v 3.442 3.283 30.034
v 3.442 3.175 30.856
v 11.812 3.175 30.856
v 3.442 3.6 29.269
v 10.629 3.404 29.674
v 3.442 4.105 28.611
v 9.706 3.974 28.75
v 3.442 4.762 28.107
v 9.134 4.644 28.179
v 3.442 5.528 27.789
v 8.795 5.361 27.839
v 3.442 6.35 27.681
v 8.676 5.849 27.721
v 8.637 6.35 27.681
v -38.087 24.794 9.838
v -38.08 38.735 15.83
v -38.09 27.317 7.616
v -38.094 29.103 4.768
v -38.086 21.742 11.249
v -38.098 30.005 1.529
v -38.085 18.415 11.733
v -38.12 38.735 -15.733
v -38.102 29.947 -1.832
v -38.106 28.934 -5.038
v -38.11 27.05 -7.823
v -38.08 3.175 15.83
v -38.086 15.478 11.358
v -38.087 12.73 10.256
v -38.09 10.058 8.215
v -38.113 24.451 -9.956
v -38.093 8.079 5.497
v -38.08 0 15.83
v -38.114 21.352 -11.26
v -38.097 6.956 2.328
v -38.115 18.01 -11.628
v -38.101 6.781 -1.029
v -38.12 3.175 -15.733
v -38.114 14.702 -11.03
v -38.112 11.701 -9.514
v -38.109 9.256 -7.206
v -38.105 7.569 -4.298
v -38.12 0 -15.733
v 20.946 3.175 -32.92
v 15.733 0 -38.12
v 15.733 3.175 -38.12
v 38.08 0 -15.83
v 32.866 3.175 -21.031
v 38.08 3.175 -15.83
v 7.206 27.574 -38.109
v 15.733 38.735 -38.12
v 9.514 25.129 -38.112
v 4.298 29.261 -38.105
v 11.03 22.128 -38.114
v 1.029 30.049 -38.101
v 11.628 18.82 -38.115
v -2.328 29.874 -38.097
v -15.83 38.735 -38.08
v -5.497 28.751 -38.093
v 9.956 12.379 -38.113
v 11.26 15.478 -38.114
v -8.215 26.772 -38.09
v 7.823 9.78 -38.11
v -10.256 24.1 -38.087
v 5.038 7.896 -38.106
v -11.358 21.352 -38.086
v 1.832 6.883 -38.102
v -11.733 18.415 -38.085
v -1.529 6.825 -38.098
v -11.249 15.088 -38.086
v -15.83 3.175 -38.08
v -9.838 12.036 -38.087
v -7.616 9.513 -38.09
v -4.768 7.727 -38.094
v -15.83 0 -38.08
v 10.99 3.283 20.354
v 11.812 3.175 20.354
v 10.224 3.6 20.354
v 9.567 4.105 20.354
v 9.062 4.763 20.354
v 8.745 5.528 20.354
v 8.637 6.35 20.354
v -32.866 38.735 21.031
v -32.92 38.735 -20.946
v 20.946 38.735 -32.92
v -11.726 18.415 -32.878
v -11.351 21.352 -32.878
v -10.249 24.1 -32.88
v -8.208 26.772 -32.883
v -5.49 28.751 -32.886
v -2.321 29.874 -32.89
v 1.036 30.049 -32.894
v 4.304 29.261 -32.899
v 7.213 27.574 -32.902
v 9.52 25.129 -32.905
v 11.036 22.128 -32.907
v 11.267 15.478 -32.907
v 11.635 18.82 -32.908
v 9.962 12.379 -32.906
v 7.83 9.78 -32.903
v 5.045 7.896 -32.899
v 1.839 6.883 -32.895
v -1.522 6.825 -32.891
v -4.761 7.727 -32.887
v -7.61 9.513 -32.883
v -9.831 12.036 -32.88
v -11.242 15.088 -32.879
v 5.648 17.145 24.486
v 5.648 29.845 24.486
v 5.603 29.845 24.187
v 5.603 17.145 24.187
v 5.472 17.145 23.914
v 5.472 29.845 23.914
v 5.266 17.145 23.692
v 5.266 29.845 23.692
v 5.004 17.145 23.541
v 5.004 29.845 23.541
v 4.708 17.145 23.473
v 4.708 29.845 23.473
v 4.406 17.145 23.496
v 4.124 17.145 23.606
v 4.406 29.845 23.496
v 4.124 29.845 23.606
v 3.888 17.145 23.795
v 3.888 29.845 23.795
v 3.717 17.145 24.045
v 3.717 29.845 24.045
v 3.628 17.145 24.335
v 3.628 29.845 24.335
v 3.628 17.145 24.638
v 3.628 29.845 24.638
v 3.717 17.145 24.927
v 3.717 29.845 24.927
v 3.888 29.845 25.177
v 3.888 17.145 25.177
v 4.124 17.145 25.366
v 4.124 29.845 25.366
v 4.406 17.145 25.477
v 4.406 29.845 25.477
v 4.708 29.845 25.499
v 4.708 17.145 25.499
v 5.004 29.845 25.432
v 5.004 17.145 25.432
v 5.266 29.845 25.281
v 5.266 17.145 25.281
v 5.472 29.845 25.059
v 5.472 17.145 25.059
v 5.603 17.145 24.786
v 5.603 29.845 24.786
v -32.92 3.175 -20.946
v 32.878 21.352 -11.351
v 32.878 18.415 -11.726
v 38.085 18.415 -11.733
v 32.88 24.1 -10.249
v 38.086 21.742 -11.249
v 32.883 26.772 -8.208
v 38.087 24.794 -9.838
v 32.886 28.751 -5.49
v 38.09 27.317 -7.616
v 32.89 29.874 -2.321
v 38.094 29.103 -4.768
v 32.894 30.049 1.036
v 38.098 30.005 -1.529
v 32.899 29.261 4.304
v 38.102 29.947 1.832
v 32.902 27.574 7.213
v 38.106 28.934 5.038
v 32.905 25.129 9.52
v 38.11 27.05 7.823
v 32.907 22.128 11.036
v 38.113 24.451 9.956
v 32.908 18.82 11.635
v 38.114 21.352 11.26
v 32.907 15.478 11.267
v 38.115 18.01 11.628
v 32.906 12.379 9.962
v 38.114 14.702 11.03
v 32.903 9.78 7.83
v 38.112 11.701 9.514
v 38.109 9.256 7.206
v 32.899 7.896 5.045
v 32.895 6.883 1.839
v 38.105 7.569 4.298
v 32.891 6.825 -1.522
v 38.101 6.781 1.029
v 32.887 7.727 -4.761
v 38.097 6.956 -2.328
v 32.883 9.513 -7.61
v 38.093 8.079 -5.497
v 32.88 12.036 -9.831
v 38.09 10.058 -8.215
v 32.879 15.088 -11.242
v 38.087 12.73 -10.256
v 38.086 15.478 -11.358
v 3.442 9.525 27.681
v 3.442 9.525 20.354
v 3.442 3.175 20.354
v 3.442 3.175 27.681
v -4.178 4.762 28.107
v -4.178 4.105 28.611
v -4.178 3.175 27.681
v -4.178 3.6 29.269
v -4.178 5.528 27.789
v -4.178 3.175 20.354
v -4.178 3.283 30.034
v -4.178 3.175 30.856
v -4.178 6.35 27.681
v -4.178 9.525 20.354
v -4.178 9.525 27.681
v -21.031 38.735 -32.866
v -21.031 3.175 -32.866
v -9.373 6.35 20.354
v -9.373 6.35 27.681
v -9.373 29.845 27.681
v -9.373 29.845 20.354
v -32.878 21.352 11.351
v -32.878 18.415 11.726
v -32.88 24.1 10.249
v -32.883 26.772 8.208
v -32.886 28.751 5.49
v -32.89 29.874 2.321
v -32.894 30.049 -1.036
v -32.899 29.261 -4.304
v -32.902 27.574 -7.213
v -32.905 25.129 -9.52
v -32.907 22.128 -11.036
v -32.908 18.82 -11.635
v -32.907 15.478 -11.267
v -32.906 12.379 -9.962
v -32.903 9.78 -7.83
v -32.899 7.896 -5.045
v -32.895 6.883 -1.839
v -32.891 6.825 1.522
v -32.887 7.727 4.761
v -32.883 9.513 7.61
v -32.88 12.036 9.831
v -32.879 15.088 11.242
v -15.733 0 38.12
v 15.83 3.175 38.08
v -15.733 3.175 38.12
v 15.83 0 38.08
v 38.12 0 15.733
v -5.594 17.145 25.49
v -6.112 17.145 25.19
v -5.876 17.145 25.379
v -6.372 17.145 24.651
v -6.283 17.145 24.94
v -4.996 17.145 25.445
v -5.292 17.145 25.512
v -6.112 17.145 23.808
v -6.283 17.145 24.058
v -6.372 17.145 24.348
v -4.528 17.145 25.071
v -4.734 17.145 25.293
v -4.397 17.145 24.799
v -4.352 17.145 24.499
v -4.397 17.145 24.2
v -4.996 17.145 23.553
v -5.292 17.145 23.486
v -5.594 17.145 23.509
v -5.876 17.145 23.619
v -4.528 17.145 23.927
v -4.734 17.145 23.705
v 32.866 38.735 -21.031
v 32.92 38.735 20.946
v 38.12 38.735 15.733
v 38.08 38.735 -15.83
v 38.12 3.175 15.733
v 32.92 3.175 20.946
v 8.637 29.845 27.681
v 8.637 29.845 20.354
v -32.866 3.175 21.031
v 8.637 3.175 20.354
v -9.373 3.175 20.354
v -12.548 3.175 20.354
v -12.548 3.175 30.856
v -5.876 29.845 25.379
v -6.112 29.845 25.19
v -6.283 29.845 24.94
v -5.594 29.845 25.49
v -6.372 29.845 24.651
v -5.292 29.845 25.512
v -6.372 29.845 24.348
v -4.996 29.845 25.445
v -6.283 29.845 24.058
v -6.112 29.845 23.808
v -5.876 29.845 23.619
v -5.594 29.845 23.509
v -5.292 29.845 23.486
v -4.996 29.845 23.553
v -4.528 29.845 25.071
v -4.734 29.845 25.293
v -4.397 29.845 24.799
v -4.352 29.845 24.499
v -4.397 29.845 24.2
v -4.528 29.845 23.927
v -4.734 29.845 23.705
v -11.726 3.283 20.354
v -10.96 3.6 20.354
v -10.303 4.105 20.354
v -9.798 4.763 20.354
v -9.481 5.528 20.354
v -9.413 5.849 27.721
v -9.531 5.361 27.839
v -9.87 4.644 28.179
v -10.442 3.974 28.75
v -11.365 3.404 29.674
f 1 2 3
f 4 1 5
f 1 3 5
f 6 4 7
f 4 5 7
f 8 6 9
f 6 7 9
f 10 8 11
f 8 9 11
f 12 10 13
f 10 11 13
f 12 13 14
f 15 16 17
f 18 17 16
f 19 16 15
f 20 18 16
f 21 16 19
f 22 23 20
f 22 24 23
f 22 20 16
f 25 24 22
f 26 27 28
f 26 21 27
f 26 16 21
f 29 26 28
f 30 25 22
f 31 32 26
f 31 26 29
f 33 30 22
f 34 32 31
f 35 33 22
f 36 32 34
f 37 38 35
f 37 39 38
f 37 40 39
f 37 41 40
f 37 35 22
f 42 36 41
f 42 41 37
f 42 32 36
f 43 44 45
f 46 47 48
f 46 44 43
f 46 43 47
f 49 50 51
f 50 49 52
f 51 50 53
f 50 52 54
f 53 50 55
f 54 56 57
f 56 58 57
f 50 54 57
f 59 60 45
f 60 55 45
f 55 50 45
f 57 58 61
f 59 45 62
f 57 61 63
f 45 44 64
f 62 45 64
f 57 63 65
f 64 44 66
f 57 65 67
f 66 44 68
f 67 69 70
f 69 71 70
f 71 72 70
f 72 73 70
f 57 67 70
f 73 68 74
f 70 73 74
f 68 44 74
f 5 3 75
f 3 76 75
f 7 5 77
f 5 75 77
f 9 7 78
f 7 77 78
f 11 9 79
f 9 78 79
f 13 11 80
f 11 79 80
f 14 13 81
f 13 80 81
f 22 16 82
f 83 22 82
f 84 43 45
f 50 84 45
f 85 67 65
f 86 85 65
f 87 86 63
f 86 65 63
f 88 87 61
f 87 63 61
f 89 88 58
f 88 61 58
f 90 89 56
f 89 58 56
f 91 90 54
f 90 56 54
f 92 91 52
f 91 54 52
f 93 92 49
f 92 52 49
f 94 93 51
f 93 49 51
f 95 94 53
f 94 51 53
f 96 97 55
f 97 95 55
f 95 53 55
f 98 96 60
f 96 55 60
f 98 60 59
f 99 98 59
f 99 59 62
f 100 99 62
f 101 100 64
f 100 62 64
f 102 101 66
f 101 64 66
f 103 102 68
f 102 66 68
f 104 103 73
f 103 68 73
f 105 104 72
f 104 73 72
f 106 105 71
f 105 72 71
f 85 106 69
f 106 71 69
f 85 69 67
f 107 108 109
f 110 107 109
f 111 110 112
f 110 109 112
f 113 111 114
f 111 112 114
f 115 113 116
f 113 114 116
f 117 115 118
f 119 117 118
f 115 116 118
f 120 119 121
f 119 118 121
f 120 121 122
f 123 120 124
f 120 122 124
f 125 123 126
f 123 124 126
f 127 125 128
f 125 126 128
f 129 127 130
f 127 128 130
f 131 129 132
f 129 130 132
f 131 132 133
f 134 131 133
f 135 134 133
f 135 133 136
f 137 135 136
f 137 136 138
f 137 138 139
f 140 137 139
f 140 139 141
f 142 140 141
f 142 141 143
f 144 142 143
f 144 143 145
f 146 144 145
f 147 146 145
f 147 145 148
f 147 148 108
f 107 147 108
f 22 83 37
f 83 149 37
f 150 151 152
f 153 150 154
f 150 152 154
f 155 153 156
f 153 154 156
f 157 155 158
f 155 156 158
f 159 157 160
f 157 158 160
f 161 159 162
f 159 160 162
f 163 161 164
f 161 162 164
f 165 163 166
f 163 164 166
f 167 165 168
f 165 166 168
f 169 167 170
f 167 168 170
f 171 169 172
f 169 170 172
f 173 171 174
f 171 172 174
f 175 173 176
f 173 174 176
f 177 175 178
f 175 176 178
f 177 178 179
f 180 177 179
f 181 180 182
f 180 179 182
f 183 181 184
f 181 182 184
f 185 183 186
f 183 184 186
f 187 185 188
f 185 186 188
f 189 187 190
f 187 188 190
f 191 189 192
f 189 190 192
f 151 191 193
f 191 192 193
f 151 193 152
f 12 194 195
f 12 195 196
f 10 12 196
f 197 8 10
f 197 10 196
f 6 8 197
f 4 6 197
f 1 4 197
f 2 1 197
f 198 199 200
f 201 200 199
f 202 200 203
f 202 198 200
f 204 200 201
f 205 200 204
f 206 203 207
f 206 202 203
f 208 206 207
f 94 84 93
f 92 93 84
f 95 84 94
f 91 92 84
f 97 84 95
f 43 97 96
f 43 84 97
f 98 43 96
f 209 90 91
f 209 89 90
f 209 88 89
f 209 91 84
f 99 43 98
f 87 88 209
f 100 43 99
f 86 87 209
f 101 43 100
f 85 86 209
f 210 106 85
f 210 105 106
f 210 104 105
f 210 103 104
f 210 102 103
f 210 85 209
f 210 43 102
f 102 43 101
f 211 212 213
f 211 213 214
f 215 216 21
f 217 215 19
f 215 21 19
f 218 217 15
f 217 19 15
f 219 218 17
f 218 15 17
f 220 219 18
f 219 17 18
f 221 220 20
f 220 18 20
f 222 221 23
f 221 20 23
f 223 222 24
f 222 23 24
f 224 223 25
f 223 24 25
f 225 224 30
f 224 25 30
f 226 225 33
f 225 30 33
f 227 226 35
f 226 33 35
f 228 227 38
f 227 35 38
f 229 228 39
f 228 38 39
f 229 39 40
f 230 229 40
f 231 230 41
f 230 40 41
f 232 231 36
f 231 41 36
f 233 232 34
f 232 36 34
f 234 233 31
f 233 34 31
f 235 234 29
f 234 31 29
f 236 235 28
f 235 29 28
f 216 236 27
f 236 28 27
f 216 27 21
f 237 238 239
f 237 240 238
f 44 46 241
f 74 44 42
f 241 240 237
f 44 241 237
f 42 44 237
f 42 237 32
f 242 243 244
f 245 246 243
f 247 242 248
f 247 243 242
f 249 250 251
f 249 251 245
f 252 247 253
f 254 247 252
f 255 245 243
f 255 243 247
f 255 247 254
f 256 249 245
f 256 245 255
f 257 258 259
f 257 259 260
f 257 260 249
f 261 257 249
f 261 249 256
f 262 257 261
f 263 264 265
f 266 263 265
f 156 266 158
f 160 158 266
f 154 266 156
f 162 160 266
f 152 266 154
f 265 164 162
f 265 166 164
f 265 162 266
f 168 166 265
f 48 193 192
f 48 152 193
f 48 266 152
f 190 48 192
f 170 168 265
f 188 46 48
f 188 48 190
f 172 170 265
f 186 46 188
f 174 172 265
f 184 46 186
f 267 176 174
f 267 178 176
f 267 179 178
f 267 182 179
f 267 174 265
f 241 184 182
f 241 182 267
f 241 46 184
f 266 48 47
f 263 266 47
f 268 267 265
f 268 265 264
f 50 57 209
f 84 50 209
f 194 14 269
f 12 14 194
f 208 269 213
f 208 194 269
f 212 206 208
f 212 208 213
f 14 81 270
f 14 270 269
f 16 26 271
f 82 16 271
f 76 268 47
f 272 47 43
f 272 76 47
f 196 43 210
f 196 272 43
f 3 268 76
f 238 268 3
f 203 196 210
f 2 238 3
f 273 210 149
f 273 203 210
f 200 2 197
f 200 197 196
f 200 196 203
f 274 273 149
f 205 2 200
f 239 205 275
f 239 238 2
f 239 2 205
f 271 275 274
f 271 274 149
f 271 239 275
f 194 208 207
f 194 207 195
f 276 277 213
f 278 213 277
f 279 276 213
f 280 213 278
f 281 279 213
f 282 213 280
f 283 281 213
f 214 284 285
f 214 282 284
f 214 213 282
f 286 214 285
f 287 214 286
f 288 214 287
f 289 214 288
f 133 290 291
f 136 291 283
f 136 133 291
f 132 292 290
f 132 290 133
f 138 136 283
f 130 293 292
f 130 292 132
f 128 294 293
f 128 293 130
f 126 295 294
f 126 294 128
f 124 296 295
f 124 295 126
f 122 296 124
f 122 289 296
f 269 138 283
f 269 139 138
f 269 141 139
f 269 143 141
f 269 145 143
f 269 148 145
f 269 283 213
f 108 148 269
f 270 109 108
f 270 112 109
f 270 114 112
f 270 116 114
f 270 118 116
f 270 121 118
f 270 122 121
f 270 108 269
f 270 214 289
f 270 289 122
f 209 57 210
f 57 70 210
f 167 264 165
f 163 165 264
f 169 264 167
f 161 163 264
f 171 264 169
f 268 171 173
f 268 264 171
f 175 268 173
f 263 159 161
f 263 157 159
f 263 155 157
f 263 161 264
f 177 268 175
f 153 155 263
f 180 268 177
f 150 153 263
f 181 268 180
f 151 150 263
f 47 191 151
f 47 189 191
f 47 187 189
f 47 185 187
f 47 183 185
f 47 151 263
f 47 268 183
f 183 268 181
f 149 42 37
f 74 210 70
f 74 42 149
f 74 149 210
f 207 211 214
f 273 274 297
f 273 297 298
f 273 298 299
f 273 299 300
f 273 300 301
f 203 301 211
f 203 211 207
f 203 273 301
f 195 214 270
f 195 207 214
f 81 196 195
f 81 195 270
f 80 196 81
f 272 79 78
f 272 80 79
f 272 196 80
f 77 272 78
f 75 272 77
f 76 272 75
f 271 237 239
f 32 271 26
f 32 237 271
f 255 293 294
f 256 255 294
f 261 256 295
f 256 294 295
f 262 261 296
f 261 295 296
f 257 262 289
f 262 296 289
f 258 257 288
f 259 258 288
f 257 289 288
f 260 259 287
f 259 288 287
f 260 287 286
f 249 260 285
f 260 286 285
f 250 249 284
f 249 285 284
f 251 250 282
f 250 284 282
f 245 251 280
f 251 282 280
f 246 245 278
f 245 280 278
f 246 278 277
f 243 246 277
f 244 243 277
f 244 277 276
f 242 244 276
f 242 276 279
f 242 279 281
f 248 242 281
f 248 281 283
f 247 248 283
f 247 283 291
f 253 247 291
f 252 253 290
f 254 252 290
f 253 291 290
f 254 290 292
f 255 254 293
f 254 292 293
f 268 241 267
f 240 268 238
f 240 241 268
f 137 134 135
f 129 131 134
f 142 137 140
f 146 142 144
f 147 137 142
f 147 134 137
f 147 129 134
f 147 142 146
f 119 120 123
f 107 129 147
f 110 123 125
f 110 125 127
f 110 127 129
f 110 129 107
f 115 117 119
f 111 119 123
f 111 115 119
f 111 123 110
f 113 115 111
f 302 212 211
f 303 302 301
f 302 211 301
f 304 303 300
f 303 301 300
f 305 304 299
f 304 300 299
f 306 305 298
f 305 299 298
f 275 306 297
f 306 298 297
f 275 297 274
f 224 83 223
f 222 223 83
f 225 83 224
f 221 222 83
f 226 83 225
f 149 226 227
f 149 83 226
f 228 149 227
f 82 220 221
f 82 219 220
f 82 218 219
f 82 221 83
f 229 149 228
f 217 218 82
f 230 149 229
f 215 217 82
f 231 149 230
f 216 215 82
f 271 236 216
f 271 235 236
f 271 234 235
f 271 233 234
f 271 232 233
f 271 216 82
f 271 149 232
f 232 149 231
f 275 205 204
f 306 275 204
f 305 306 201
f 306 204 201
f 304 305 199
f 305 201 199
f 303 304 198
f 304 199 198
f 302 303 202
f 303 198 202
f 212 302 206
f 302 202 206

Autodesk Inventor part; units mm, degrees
ref_plane "YZ Plane" through (0, 0, 0) normal (1, 0, 0) x (0, 1, 0)
ref_plane "XZ Plane" through (0, 0, 0) normal (0, 1, 0) x (-1, 0, 0)
ref_plane "XY Plane" through (0, 0, 0) normal (0, 0, 1) x (1, 0, 0)
sketch "Sketch1" plane through (0, 0, 0) normal (0, 1, 0) x (-1, 0, 0)
  line L0 (15.8302, -38.0798) -> (-15.7328, -38.1201)
  line L1 (-15.7328, -38.1201) -> (-38.0798, -15.8302)
  line L2 (-38.0798, -15.8302) -> (-38.1201, 15.7328)
  line L3 (-38.1201, 15.7328) -> (-15.8302, 38.0798)
  line L4 (-15.8302, 38.0798) -> (15.7328, 38.1201)
  line L5 (15.7328, 38.1201) -> (38.0798, 15.8302)
  line L6 (38.0798, 15.8302) -> (38.1201, -15.7328)
  line L7 (38.1201, -15.7328) -> (15.8302, -38.0798)
  point P0 (0, 0)
  point P1 (0, 0)
  dimension "d0" = 76.2
extrude "Extrusion1" add sketch "Sketch1" along normal blind 3.175
sketch "Sketch3" plane through (0, 3.175, 0) normal (0, 1, 0) x (1, 0, 0)
  line L0 (38.1201, -15.7328) -> (38.0798, 15.8302) projected
  line L1 (-38.1201, 15.7328) -> (-38.0798, -15.8302) projected
  line L2 (32.9198, -20.9465) -> (32.8661, 21.0306)
  line L3 (-32.9198, 20.9465) -> (-32.8661, -21.0306)
  line L4 (-38.1201, 15.7328) -> (-38.0798, -15.8302) projected
  line L5 (38.1201, -15.7328) -> (38.0798, 15.8302) projected
  line L6 (38.1201, -15.7328) -> (32.9198, -20.9465)
  line L7 (38.0798, 15.8302) -> (38.1201, -15.7328) projected
  line L8 (38.1201, -15.7328) -> (38.0798, 15.8302)
  line L9 (38.0798, 15.8302) -> (32.8661, 21.0306)
  line L10 (-32.9198, 20.9465) -> (-38.1201, 15.7328)
  line L11 (-38.1201, 15.7328) -> (-38.0798, -15.8302)
  line L12 (-38.0798, -15.8302) -> (-38.1201, 15.7328) projected
  line L13 (-38.0798, -15.8302) -> (-32.8661, -21.0306)
  line L14 (-38.0798, -15.8302) -> (-15.7328, -38.1201) projected
  line L15 (15.8302, -38.0798) -> (38.1201, -15.7328) projected
  line L16 (38.0798, 15.8302) -> (15.7328, 38.1201) projected
  line L17 (38.1201, -15.7328) -> (32.9198, -20.9465)
  line L18 (38.0798, 15.8302) -> (32.8661, 21.0306)
  line L19 (15.7328, 38.1201) -> (38.0798, 15.8302) projected
  line L20 (38.1201, -15.7328) -> (38.0798, 15.8302)
  point P0 (0, 0)
  dimension "d5" = 5.207
  dimension "d6" = 5.207
extrude "Extrusion2" add sketch "Sketch3" along normal blind 35.56
sketch "Sketch5" plane through (38.0798, 0, -15.8302) normal (1, 0, -0.0013) x (-0.0013, 0, -1)
  circle A0 centre (-15.7815, 18.415) radius 11.43 projected
  circle A1 centre (-15.7815, 18.415) radius 11.684
  point P0 (-15.7815, 0)
  dimension "d9" = 0.254
extrude "Extrusion3" cut sketch "Sketch5" against normal blind 26.416 contours A0 | A1
sketch "Sketch6" plane through (-38.0798, 0, 15.8302) normal (-1, 0, 0.0013) x (0.0013, 0, 1)
  circle A0 centre (-15.7815, 18.415) radius 11.43 projected
  circle A1 centre (-15.7815, 18.415) radius 11.684
  point P0 (-15.7815, 0)
  dimension "d12" = 0.254
extrude "Extrusion4" cut sketch "Sketch6" against normal blind 26.416 contours A0 | A1
sketch "Sketch7" plane through (0, 3.175, 0) normal (0, 1, 0) x (1, 0, 0)
  line L0 (15.7328, 38.1201) -> (-15.8302, 38.0798) projected
  line L1 (20.9465, 32.9198) -> (-21.0306, 32.8661)
  line L2 (-15.8302, 38.0798) -> (-32.9198, 20.9465) projected
  line L3 (32.8661, 21.0306) -> (15.7328, 38.1201) projected
  line L4 (-38.1201, 15.7328) -> (-15.8302, 38.0798) projected
  line L5 (-21.0306, 32.8661) -> (-15.8302, 38.0798)
  line L6 (-15.8302, 38.0798) -> (15.7328, 38.1201)
  line L7 (20.9465, 32.9198) -> (15.7328, 38.1201)
  point P0 (0, 0)
  dimension "d15" = 5.207
extrude "Extrusion5" add sketch "Sketch7" along normal blind 35.56
sketch "Sketch8" plane through (-15.8302, 0, -38.0798) normal (-0.0013, 0, -1) x (-1, 0, 0.0013)
  circle A0 centre (-15.7815, 18.415) radius 11.43 projected
  circle A1 centre (-15.7815, 18.415) radius 11.684
  point P0 (-15.7815, 0)
  dimension "d18" = 0.254
extrude "Extrusion6" cut sketch "Sketch8" against normal blind 26.416 contours A0 | A1
sketch "Sketch9" plane through (0, 3.175, 0) normal (0, 1, 0) x (1, 0, 0)
  line L0 (-9.3728, -20.3542) -> (-9.3647, -26.7042) projected
  line L1 (8.6353, -26.6812) -> (8.6272, -20.3312) projected
  line L2 (-8.3634, -27.7029) -> (7.6366, -27.6825) projected
  line L3 (-9.3728, -20.3542) -> (8.6366, -20.3542)
  line L4 (8.6366, -20.3542) -> (8.6366, -27.6812)
  line L5 (8.6366, -27.6812) -> (-9.3728, -27.6812)
  line L6 (-9.3728, -27.6812) -> (-9.3728, -20.3542)
  point P0 (0, 0)
extrude "Extrusion7" add sketch "Sketch9" along normal blind 26.67
sketch "Sketch10" plane through (0, 29.845, 0) normal (0, 1, 0) x (1, 0, 0)
  arc A0 (-5.3692, -23.1491) -> (-5.3658, -25.8491) centre (-5.3675, -24.4991) ccw projected
  arc A1 (-5.3658, -25.8491) -> (-5.3692, -23.1491) centre (-5.3675, -24.4991) ccw projected
  arc A2 (4.6308, -23.1363) -> (4.6342, -25.8363) centre (4.6325, -24.4863) ccw projected
  arc A3 (4.6342, -25.8363) -> (4.6308, -23.1363) centre (4.6325, -24.4863) ccw projected
  circle A4 centre (-5.3675, -24.4991) radius 1.016
  circle A5 centre (4.6325, -24.4863) radius 1.016
  point P0 (0, 0)
  dimension "d24" = 1.35
  dimension "d25" = 2.032
  dimension "d26" = 2.032
extrude "Extrusion8" cut sketch "Sketch10" against normal blind 12.7 contours A4 | A5
sketch "Sketch11" plane through (-9.3728, 3.175, 27.6812) normal (0, 0, 1) x (1, 0, 0)
  line L0 (18.0094, 0) -> (0, 0) projected
  line L1 (5.1947, 6.35) -> (12.8147, 6.35)
  line L2 (12.8147, 6.35) -> (12.8147, 0)
  line L3 (12.8147, 0) -> (5.1947, 0)
  line L4 (5.1947, 0) -> (5.1947, 6.35)
  line L5 (18.0094, 0) -> (18.0094, 26.67) projected
  point P0 (9.3728, -3.175)
  dimension "d31" = 5.1947
  dimension "d32" = 7.62
  dimension "d33" = 6.35
  dimension "d36" = 0
extrude "Extrusion9" cut sketch "Sketch11" against normal blind 12.7
fillet "Fillet2" radius 3.175 4 edges at (-6.7754, 3.175, 27.6812) (-9.3728, 3.175, 24.0177) (6.0392, 3.175, 27.6812) (8.6366, 3.175, 24.0177)
properties part number "Main_assy_base"
